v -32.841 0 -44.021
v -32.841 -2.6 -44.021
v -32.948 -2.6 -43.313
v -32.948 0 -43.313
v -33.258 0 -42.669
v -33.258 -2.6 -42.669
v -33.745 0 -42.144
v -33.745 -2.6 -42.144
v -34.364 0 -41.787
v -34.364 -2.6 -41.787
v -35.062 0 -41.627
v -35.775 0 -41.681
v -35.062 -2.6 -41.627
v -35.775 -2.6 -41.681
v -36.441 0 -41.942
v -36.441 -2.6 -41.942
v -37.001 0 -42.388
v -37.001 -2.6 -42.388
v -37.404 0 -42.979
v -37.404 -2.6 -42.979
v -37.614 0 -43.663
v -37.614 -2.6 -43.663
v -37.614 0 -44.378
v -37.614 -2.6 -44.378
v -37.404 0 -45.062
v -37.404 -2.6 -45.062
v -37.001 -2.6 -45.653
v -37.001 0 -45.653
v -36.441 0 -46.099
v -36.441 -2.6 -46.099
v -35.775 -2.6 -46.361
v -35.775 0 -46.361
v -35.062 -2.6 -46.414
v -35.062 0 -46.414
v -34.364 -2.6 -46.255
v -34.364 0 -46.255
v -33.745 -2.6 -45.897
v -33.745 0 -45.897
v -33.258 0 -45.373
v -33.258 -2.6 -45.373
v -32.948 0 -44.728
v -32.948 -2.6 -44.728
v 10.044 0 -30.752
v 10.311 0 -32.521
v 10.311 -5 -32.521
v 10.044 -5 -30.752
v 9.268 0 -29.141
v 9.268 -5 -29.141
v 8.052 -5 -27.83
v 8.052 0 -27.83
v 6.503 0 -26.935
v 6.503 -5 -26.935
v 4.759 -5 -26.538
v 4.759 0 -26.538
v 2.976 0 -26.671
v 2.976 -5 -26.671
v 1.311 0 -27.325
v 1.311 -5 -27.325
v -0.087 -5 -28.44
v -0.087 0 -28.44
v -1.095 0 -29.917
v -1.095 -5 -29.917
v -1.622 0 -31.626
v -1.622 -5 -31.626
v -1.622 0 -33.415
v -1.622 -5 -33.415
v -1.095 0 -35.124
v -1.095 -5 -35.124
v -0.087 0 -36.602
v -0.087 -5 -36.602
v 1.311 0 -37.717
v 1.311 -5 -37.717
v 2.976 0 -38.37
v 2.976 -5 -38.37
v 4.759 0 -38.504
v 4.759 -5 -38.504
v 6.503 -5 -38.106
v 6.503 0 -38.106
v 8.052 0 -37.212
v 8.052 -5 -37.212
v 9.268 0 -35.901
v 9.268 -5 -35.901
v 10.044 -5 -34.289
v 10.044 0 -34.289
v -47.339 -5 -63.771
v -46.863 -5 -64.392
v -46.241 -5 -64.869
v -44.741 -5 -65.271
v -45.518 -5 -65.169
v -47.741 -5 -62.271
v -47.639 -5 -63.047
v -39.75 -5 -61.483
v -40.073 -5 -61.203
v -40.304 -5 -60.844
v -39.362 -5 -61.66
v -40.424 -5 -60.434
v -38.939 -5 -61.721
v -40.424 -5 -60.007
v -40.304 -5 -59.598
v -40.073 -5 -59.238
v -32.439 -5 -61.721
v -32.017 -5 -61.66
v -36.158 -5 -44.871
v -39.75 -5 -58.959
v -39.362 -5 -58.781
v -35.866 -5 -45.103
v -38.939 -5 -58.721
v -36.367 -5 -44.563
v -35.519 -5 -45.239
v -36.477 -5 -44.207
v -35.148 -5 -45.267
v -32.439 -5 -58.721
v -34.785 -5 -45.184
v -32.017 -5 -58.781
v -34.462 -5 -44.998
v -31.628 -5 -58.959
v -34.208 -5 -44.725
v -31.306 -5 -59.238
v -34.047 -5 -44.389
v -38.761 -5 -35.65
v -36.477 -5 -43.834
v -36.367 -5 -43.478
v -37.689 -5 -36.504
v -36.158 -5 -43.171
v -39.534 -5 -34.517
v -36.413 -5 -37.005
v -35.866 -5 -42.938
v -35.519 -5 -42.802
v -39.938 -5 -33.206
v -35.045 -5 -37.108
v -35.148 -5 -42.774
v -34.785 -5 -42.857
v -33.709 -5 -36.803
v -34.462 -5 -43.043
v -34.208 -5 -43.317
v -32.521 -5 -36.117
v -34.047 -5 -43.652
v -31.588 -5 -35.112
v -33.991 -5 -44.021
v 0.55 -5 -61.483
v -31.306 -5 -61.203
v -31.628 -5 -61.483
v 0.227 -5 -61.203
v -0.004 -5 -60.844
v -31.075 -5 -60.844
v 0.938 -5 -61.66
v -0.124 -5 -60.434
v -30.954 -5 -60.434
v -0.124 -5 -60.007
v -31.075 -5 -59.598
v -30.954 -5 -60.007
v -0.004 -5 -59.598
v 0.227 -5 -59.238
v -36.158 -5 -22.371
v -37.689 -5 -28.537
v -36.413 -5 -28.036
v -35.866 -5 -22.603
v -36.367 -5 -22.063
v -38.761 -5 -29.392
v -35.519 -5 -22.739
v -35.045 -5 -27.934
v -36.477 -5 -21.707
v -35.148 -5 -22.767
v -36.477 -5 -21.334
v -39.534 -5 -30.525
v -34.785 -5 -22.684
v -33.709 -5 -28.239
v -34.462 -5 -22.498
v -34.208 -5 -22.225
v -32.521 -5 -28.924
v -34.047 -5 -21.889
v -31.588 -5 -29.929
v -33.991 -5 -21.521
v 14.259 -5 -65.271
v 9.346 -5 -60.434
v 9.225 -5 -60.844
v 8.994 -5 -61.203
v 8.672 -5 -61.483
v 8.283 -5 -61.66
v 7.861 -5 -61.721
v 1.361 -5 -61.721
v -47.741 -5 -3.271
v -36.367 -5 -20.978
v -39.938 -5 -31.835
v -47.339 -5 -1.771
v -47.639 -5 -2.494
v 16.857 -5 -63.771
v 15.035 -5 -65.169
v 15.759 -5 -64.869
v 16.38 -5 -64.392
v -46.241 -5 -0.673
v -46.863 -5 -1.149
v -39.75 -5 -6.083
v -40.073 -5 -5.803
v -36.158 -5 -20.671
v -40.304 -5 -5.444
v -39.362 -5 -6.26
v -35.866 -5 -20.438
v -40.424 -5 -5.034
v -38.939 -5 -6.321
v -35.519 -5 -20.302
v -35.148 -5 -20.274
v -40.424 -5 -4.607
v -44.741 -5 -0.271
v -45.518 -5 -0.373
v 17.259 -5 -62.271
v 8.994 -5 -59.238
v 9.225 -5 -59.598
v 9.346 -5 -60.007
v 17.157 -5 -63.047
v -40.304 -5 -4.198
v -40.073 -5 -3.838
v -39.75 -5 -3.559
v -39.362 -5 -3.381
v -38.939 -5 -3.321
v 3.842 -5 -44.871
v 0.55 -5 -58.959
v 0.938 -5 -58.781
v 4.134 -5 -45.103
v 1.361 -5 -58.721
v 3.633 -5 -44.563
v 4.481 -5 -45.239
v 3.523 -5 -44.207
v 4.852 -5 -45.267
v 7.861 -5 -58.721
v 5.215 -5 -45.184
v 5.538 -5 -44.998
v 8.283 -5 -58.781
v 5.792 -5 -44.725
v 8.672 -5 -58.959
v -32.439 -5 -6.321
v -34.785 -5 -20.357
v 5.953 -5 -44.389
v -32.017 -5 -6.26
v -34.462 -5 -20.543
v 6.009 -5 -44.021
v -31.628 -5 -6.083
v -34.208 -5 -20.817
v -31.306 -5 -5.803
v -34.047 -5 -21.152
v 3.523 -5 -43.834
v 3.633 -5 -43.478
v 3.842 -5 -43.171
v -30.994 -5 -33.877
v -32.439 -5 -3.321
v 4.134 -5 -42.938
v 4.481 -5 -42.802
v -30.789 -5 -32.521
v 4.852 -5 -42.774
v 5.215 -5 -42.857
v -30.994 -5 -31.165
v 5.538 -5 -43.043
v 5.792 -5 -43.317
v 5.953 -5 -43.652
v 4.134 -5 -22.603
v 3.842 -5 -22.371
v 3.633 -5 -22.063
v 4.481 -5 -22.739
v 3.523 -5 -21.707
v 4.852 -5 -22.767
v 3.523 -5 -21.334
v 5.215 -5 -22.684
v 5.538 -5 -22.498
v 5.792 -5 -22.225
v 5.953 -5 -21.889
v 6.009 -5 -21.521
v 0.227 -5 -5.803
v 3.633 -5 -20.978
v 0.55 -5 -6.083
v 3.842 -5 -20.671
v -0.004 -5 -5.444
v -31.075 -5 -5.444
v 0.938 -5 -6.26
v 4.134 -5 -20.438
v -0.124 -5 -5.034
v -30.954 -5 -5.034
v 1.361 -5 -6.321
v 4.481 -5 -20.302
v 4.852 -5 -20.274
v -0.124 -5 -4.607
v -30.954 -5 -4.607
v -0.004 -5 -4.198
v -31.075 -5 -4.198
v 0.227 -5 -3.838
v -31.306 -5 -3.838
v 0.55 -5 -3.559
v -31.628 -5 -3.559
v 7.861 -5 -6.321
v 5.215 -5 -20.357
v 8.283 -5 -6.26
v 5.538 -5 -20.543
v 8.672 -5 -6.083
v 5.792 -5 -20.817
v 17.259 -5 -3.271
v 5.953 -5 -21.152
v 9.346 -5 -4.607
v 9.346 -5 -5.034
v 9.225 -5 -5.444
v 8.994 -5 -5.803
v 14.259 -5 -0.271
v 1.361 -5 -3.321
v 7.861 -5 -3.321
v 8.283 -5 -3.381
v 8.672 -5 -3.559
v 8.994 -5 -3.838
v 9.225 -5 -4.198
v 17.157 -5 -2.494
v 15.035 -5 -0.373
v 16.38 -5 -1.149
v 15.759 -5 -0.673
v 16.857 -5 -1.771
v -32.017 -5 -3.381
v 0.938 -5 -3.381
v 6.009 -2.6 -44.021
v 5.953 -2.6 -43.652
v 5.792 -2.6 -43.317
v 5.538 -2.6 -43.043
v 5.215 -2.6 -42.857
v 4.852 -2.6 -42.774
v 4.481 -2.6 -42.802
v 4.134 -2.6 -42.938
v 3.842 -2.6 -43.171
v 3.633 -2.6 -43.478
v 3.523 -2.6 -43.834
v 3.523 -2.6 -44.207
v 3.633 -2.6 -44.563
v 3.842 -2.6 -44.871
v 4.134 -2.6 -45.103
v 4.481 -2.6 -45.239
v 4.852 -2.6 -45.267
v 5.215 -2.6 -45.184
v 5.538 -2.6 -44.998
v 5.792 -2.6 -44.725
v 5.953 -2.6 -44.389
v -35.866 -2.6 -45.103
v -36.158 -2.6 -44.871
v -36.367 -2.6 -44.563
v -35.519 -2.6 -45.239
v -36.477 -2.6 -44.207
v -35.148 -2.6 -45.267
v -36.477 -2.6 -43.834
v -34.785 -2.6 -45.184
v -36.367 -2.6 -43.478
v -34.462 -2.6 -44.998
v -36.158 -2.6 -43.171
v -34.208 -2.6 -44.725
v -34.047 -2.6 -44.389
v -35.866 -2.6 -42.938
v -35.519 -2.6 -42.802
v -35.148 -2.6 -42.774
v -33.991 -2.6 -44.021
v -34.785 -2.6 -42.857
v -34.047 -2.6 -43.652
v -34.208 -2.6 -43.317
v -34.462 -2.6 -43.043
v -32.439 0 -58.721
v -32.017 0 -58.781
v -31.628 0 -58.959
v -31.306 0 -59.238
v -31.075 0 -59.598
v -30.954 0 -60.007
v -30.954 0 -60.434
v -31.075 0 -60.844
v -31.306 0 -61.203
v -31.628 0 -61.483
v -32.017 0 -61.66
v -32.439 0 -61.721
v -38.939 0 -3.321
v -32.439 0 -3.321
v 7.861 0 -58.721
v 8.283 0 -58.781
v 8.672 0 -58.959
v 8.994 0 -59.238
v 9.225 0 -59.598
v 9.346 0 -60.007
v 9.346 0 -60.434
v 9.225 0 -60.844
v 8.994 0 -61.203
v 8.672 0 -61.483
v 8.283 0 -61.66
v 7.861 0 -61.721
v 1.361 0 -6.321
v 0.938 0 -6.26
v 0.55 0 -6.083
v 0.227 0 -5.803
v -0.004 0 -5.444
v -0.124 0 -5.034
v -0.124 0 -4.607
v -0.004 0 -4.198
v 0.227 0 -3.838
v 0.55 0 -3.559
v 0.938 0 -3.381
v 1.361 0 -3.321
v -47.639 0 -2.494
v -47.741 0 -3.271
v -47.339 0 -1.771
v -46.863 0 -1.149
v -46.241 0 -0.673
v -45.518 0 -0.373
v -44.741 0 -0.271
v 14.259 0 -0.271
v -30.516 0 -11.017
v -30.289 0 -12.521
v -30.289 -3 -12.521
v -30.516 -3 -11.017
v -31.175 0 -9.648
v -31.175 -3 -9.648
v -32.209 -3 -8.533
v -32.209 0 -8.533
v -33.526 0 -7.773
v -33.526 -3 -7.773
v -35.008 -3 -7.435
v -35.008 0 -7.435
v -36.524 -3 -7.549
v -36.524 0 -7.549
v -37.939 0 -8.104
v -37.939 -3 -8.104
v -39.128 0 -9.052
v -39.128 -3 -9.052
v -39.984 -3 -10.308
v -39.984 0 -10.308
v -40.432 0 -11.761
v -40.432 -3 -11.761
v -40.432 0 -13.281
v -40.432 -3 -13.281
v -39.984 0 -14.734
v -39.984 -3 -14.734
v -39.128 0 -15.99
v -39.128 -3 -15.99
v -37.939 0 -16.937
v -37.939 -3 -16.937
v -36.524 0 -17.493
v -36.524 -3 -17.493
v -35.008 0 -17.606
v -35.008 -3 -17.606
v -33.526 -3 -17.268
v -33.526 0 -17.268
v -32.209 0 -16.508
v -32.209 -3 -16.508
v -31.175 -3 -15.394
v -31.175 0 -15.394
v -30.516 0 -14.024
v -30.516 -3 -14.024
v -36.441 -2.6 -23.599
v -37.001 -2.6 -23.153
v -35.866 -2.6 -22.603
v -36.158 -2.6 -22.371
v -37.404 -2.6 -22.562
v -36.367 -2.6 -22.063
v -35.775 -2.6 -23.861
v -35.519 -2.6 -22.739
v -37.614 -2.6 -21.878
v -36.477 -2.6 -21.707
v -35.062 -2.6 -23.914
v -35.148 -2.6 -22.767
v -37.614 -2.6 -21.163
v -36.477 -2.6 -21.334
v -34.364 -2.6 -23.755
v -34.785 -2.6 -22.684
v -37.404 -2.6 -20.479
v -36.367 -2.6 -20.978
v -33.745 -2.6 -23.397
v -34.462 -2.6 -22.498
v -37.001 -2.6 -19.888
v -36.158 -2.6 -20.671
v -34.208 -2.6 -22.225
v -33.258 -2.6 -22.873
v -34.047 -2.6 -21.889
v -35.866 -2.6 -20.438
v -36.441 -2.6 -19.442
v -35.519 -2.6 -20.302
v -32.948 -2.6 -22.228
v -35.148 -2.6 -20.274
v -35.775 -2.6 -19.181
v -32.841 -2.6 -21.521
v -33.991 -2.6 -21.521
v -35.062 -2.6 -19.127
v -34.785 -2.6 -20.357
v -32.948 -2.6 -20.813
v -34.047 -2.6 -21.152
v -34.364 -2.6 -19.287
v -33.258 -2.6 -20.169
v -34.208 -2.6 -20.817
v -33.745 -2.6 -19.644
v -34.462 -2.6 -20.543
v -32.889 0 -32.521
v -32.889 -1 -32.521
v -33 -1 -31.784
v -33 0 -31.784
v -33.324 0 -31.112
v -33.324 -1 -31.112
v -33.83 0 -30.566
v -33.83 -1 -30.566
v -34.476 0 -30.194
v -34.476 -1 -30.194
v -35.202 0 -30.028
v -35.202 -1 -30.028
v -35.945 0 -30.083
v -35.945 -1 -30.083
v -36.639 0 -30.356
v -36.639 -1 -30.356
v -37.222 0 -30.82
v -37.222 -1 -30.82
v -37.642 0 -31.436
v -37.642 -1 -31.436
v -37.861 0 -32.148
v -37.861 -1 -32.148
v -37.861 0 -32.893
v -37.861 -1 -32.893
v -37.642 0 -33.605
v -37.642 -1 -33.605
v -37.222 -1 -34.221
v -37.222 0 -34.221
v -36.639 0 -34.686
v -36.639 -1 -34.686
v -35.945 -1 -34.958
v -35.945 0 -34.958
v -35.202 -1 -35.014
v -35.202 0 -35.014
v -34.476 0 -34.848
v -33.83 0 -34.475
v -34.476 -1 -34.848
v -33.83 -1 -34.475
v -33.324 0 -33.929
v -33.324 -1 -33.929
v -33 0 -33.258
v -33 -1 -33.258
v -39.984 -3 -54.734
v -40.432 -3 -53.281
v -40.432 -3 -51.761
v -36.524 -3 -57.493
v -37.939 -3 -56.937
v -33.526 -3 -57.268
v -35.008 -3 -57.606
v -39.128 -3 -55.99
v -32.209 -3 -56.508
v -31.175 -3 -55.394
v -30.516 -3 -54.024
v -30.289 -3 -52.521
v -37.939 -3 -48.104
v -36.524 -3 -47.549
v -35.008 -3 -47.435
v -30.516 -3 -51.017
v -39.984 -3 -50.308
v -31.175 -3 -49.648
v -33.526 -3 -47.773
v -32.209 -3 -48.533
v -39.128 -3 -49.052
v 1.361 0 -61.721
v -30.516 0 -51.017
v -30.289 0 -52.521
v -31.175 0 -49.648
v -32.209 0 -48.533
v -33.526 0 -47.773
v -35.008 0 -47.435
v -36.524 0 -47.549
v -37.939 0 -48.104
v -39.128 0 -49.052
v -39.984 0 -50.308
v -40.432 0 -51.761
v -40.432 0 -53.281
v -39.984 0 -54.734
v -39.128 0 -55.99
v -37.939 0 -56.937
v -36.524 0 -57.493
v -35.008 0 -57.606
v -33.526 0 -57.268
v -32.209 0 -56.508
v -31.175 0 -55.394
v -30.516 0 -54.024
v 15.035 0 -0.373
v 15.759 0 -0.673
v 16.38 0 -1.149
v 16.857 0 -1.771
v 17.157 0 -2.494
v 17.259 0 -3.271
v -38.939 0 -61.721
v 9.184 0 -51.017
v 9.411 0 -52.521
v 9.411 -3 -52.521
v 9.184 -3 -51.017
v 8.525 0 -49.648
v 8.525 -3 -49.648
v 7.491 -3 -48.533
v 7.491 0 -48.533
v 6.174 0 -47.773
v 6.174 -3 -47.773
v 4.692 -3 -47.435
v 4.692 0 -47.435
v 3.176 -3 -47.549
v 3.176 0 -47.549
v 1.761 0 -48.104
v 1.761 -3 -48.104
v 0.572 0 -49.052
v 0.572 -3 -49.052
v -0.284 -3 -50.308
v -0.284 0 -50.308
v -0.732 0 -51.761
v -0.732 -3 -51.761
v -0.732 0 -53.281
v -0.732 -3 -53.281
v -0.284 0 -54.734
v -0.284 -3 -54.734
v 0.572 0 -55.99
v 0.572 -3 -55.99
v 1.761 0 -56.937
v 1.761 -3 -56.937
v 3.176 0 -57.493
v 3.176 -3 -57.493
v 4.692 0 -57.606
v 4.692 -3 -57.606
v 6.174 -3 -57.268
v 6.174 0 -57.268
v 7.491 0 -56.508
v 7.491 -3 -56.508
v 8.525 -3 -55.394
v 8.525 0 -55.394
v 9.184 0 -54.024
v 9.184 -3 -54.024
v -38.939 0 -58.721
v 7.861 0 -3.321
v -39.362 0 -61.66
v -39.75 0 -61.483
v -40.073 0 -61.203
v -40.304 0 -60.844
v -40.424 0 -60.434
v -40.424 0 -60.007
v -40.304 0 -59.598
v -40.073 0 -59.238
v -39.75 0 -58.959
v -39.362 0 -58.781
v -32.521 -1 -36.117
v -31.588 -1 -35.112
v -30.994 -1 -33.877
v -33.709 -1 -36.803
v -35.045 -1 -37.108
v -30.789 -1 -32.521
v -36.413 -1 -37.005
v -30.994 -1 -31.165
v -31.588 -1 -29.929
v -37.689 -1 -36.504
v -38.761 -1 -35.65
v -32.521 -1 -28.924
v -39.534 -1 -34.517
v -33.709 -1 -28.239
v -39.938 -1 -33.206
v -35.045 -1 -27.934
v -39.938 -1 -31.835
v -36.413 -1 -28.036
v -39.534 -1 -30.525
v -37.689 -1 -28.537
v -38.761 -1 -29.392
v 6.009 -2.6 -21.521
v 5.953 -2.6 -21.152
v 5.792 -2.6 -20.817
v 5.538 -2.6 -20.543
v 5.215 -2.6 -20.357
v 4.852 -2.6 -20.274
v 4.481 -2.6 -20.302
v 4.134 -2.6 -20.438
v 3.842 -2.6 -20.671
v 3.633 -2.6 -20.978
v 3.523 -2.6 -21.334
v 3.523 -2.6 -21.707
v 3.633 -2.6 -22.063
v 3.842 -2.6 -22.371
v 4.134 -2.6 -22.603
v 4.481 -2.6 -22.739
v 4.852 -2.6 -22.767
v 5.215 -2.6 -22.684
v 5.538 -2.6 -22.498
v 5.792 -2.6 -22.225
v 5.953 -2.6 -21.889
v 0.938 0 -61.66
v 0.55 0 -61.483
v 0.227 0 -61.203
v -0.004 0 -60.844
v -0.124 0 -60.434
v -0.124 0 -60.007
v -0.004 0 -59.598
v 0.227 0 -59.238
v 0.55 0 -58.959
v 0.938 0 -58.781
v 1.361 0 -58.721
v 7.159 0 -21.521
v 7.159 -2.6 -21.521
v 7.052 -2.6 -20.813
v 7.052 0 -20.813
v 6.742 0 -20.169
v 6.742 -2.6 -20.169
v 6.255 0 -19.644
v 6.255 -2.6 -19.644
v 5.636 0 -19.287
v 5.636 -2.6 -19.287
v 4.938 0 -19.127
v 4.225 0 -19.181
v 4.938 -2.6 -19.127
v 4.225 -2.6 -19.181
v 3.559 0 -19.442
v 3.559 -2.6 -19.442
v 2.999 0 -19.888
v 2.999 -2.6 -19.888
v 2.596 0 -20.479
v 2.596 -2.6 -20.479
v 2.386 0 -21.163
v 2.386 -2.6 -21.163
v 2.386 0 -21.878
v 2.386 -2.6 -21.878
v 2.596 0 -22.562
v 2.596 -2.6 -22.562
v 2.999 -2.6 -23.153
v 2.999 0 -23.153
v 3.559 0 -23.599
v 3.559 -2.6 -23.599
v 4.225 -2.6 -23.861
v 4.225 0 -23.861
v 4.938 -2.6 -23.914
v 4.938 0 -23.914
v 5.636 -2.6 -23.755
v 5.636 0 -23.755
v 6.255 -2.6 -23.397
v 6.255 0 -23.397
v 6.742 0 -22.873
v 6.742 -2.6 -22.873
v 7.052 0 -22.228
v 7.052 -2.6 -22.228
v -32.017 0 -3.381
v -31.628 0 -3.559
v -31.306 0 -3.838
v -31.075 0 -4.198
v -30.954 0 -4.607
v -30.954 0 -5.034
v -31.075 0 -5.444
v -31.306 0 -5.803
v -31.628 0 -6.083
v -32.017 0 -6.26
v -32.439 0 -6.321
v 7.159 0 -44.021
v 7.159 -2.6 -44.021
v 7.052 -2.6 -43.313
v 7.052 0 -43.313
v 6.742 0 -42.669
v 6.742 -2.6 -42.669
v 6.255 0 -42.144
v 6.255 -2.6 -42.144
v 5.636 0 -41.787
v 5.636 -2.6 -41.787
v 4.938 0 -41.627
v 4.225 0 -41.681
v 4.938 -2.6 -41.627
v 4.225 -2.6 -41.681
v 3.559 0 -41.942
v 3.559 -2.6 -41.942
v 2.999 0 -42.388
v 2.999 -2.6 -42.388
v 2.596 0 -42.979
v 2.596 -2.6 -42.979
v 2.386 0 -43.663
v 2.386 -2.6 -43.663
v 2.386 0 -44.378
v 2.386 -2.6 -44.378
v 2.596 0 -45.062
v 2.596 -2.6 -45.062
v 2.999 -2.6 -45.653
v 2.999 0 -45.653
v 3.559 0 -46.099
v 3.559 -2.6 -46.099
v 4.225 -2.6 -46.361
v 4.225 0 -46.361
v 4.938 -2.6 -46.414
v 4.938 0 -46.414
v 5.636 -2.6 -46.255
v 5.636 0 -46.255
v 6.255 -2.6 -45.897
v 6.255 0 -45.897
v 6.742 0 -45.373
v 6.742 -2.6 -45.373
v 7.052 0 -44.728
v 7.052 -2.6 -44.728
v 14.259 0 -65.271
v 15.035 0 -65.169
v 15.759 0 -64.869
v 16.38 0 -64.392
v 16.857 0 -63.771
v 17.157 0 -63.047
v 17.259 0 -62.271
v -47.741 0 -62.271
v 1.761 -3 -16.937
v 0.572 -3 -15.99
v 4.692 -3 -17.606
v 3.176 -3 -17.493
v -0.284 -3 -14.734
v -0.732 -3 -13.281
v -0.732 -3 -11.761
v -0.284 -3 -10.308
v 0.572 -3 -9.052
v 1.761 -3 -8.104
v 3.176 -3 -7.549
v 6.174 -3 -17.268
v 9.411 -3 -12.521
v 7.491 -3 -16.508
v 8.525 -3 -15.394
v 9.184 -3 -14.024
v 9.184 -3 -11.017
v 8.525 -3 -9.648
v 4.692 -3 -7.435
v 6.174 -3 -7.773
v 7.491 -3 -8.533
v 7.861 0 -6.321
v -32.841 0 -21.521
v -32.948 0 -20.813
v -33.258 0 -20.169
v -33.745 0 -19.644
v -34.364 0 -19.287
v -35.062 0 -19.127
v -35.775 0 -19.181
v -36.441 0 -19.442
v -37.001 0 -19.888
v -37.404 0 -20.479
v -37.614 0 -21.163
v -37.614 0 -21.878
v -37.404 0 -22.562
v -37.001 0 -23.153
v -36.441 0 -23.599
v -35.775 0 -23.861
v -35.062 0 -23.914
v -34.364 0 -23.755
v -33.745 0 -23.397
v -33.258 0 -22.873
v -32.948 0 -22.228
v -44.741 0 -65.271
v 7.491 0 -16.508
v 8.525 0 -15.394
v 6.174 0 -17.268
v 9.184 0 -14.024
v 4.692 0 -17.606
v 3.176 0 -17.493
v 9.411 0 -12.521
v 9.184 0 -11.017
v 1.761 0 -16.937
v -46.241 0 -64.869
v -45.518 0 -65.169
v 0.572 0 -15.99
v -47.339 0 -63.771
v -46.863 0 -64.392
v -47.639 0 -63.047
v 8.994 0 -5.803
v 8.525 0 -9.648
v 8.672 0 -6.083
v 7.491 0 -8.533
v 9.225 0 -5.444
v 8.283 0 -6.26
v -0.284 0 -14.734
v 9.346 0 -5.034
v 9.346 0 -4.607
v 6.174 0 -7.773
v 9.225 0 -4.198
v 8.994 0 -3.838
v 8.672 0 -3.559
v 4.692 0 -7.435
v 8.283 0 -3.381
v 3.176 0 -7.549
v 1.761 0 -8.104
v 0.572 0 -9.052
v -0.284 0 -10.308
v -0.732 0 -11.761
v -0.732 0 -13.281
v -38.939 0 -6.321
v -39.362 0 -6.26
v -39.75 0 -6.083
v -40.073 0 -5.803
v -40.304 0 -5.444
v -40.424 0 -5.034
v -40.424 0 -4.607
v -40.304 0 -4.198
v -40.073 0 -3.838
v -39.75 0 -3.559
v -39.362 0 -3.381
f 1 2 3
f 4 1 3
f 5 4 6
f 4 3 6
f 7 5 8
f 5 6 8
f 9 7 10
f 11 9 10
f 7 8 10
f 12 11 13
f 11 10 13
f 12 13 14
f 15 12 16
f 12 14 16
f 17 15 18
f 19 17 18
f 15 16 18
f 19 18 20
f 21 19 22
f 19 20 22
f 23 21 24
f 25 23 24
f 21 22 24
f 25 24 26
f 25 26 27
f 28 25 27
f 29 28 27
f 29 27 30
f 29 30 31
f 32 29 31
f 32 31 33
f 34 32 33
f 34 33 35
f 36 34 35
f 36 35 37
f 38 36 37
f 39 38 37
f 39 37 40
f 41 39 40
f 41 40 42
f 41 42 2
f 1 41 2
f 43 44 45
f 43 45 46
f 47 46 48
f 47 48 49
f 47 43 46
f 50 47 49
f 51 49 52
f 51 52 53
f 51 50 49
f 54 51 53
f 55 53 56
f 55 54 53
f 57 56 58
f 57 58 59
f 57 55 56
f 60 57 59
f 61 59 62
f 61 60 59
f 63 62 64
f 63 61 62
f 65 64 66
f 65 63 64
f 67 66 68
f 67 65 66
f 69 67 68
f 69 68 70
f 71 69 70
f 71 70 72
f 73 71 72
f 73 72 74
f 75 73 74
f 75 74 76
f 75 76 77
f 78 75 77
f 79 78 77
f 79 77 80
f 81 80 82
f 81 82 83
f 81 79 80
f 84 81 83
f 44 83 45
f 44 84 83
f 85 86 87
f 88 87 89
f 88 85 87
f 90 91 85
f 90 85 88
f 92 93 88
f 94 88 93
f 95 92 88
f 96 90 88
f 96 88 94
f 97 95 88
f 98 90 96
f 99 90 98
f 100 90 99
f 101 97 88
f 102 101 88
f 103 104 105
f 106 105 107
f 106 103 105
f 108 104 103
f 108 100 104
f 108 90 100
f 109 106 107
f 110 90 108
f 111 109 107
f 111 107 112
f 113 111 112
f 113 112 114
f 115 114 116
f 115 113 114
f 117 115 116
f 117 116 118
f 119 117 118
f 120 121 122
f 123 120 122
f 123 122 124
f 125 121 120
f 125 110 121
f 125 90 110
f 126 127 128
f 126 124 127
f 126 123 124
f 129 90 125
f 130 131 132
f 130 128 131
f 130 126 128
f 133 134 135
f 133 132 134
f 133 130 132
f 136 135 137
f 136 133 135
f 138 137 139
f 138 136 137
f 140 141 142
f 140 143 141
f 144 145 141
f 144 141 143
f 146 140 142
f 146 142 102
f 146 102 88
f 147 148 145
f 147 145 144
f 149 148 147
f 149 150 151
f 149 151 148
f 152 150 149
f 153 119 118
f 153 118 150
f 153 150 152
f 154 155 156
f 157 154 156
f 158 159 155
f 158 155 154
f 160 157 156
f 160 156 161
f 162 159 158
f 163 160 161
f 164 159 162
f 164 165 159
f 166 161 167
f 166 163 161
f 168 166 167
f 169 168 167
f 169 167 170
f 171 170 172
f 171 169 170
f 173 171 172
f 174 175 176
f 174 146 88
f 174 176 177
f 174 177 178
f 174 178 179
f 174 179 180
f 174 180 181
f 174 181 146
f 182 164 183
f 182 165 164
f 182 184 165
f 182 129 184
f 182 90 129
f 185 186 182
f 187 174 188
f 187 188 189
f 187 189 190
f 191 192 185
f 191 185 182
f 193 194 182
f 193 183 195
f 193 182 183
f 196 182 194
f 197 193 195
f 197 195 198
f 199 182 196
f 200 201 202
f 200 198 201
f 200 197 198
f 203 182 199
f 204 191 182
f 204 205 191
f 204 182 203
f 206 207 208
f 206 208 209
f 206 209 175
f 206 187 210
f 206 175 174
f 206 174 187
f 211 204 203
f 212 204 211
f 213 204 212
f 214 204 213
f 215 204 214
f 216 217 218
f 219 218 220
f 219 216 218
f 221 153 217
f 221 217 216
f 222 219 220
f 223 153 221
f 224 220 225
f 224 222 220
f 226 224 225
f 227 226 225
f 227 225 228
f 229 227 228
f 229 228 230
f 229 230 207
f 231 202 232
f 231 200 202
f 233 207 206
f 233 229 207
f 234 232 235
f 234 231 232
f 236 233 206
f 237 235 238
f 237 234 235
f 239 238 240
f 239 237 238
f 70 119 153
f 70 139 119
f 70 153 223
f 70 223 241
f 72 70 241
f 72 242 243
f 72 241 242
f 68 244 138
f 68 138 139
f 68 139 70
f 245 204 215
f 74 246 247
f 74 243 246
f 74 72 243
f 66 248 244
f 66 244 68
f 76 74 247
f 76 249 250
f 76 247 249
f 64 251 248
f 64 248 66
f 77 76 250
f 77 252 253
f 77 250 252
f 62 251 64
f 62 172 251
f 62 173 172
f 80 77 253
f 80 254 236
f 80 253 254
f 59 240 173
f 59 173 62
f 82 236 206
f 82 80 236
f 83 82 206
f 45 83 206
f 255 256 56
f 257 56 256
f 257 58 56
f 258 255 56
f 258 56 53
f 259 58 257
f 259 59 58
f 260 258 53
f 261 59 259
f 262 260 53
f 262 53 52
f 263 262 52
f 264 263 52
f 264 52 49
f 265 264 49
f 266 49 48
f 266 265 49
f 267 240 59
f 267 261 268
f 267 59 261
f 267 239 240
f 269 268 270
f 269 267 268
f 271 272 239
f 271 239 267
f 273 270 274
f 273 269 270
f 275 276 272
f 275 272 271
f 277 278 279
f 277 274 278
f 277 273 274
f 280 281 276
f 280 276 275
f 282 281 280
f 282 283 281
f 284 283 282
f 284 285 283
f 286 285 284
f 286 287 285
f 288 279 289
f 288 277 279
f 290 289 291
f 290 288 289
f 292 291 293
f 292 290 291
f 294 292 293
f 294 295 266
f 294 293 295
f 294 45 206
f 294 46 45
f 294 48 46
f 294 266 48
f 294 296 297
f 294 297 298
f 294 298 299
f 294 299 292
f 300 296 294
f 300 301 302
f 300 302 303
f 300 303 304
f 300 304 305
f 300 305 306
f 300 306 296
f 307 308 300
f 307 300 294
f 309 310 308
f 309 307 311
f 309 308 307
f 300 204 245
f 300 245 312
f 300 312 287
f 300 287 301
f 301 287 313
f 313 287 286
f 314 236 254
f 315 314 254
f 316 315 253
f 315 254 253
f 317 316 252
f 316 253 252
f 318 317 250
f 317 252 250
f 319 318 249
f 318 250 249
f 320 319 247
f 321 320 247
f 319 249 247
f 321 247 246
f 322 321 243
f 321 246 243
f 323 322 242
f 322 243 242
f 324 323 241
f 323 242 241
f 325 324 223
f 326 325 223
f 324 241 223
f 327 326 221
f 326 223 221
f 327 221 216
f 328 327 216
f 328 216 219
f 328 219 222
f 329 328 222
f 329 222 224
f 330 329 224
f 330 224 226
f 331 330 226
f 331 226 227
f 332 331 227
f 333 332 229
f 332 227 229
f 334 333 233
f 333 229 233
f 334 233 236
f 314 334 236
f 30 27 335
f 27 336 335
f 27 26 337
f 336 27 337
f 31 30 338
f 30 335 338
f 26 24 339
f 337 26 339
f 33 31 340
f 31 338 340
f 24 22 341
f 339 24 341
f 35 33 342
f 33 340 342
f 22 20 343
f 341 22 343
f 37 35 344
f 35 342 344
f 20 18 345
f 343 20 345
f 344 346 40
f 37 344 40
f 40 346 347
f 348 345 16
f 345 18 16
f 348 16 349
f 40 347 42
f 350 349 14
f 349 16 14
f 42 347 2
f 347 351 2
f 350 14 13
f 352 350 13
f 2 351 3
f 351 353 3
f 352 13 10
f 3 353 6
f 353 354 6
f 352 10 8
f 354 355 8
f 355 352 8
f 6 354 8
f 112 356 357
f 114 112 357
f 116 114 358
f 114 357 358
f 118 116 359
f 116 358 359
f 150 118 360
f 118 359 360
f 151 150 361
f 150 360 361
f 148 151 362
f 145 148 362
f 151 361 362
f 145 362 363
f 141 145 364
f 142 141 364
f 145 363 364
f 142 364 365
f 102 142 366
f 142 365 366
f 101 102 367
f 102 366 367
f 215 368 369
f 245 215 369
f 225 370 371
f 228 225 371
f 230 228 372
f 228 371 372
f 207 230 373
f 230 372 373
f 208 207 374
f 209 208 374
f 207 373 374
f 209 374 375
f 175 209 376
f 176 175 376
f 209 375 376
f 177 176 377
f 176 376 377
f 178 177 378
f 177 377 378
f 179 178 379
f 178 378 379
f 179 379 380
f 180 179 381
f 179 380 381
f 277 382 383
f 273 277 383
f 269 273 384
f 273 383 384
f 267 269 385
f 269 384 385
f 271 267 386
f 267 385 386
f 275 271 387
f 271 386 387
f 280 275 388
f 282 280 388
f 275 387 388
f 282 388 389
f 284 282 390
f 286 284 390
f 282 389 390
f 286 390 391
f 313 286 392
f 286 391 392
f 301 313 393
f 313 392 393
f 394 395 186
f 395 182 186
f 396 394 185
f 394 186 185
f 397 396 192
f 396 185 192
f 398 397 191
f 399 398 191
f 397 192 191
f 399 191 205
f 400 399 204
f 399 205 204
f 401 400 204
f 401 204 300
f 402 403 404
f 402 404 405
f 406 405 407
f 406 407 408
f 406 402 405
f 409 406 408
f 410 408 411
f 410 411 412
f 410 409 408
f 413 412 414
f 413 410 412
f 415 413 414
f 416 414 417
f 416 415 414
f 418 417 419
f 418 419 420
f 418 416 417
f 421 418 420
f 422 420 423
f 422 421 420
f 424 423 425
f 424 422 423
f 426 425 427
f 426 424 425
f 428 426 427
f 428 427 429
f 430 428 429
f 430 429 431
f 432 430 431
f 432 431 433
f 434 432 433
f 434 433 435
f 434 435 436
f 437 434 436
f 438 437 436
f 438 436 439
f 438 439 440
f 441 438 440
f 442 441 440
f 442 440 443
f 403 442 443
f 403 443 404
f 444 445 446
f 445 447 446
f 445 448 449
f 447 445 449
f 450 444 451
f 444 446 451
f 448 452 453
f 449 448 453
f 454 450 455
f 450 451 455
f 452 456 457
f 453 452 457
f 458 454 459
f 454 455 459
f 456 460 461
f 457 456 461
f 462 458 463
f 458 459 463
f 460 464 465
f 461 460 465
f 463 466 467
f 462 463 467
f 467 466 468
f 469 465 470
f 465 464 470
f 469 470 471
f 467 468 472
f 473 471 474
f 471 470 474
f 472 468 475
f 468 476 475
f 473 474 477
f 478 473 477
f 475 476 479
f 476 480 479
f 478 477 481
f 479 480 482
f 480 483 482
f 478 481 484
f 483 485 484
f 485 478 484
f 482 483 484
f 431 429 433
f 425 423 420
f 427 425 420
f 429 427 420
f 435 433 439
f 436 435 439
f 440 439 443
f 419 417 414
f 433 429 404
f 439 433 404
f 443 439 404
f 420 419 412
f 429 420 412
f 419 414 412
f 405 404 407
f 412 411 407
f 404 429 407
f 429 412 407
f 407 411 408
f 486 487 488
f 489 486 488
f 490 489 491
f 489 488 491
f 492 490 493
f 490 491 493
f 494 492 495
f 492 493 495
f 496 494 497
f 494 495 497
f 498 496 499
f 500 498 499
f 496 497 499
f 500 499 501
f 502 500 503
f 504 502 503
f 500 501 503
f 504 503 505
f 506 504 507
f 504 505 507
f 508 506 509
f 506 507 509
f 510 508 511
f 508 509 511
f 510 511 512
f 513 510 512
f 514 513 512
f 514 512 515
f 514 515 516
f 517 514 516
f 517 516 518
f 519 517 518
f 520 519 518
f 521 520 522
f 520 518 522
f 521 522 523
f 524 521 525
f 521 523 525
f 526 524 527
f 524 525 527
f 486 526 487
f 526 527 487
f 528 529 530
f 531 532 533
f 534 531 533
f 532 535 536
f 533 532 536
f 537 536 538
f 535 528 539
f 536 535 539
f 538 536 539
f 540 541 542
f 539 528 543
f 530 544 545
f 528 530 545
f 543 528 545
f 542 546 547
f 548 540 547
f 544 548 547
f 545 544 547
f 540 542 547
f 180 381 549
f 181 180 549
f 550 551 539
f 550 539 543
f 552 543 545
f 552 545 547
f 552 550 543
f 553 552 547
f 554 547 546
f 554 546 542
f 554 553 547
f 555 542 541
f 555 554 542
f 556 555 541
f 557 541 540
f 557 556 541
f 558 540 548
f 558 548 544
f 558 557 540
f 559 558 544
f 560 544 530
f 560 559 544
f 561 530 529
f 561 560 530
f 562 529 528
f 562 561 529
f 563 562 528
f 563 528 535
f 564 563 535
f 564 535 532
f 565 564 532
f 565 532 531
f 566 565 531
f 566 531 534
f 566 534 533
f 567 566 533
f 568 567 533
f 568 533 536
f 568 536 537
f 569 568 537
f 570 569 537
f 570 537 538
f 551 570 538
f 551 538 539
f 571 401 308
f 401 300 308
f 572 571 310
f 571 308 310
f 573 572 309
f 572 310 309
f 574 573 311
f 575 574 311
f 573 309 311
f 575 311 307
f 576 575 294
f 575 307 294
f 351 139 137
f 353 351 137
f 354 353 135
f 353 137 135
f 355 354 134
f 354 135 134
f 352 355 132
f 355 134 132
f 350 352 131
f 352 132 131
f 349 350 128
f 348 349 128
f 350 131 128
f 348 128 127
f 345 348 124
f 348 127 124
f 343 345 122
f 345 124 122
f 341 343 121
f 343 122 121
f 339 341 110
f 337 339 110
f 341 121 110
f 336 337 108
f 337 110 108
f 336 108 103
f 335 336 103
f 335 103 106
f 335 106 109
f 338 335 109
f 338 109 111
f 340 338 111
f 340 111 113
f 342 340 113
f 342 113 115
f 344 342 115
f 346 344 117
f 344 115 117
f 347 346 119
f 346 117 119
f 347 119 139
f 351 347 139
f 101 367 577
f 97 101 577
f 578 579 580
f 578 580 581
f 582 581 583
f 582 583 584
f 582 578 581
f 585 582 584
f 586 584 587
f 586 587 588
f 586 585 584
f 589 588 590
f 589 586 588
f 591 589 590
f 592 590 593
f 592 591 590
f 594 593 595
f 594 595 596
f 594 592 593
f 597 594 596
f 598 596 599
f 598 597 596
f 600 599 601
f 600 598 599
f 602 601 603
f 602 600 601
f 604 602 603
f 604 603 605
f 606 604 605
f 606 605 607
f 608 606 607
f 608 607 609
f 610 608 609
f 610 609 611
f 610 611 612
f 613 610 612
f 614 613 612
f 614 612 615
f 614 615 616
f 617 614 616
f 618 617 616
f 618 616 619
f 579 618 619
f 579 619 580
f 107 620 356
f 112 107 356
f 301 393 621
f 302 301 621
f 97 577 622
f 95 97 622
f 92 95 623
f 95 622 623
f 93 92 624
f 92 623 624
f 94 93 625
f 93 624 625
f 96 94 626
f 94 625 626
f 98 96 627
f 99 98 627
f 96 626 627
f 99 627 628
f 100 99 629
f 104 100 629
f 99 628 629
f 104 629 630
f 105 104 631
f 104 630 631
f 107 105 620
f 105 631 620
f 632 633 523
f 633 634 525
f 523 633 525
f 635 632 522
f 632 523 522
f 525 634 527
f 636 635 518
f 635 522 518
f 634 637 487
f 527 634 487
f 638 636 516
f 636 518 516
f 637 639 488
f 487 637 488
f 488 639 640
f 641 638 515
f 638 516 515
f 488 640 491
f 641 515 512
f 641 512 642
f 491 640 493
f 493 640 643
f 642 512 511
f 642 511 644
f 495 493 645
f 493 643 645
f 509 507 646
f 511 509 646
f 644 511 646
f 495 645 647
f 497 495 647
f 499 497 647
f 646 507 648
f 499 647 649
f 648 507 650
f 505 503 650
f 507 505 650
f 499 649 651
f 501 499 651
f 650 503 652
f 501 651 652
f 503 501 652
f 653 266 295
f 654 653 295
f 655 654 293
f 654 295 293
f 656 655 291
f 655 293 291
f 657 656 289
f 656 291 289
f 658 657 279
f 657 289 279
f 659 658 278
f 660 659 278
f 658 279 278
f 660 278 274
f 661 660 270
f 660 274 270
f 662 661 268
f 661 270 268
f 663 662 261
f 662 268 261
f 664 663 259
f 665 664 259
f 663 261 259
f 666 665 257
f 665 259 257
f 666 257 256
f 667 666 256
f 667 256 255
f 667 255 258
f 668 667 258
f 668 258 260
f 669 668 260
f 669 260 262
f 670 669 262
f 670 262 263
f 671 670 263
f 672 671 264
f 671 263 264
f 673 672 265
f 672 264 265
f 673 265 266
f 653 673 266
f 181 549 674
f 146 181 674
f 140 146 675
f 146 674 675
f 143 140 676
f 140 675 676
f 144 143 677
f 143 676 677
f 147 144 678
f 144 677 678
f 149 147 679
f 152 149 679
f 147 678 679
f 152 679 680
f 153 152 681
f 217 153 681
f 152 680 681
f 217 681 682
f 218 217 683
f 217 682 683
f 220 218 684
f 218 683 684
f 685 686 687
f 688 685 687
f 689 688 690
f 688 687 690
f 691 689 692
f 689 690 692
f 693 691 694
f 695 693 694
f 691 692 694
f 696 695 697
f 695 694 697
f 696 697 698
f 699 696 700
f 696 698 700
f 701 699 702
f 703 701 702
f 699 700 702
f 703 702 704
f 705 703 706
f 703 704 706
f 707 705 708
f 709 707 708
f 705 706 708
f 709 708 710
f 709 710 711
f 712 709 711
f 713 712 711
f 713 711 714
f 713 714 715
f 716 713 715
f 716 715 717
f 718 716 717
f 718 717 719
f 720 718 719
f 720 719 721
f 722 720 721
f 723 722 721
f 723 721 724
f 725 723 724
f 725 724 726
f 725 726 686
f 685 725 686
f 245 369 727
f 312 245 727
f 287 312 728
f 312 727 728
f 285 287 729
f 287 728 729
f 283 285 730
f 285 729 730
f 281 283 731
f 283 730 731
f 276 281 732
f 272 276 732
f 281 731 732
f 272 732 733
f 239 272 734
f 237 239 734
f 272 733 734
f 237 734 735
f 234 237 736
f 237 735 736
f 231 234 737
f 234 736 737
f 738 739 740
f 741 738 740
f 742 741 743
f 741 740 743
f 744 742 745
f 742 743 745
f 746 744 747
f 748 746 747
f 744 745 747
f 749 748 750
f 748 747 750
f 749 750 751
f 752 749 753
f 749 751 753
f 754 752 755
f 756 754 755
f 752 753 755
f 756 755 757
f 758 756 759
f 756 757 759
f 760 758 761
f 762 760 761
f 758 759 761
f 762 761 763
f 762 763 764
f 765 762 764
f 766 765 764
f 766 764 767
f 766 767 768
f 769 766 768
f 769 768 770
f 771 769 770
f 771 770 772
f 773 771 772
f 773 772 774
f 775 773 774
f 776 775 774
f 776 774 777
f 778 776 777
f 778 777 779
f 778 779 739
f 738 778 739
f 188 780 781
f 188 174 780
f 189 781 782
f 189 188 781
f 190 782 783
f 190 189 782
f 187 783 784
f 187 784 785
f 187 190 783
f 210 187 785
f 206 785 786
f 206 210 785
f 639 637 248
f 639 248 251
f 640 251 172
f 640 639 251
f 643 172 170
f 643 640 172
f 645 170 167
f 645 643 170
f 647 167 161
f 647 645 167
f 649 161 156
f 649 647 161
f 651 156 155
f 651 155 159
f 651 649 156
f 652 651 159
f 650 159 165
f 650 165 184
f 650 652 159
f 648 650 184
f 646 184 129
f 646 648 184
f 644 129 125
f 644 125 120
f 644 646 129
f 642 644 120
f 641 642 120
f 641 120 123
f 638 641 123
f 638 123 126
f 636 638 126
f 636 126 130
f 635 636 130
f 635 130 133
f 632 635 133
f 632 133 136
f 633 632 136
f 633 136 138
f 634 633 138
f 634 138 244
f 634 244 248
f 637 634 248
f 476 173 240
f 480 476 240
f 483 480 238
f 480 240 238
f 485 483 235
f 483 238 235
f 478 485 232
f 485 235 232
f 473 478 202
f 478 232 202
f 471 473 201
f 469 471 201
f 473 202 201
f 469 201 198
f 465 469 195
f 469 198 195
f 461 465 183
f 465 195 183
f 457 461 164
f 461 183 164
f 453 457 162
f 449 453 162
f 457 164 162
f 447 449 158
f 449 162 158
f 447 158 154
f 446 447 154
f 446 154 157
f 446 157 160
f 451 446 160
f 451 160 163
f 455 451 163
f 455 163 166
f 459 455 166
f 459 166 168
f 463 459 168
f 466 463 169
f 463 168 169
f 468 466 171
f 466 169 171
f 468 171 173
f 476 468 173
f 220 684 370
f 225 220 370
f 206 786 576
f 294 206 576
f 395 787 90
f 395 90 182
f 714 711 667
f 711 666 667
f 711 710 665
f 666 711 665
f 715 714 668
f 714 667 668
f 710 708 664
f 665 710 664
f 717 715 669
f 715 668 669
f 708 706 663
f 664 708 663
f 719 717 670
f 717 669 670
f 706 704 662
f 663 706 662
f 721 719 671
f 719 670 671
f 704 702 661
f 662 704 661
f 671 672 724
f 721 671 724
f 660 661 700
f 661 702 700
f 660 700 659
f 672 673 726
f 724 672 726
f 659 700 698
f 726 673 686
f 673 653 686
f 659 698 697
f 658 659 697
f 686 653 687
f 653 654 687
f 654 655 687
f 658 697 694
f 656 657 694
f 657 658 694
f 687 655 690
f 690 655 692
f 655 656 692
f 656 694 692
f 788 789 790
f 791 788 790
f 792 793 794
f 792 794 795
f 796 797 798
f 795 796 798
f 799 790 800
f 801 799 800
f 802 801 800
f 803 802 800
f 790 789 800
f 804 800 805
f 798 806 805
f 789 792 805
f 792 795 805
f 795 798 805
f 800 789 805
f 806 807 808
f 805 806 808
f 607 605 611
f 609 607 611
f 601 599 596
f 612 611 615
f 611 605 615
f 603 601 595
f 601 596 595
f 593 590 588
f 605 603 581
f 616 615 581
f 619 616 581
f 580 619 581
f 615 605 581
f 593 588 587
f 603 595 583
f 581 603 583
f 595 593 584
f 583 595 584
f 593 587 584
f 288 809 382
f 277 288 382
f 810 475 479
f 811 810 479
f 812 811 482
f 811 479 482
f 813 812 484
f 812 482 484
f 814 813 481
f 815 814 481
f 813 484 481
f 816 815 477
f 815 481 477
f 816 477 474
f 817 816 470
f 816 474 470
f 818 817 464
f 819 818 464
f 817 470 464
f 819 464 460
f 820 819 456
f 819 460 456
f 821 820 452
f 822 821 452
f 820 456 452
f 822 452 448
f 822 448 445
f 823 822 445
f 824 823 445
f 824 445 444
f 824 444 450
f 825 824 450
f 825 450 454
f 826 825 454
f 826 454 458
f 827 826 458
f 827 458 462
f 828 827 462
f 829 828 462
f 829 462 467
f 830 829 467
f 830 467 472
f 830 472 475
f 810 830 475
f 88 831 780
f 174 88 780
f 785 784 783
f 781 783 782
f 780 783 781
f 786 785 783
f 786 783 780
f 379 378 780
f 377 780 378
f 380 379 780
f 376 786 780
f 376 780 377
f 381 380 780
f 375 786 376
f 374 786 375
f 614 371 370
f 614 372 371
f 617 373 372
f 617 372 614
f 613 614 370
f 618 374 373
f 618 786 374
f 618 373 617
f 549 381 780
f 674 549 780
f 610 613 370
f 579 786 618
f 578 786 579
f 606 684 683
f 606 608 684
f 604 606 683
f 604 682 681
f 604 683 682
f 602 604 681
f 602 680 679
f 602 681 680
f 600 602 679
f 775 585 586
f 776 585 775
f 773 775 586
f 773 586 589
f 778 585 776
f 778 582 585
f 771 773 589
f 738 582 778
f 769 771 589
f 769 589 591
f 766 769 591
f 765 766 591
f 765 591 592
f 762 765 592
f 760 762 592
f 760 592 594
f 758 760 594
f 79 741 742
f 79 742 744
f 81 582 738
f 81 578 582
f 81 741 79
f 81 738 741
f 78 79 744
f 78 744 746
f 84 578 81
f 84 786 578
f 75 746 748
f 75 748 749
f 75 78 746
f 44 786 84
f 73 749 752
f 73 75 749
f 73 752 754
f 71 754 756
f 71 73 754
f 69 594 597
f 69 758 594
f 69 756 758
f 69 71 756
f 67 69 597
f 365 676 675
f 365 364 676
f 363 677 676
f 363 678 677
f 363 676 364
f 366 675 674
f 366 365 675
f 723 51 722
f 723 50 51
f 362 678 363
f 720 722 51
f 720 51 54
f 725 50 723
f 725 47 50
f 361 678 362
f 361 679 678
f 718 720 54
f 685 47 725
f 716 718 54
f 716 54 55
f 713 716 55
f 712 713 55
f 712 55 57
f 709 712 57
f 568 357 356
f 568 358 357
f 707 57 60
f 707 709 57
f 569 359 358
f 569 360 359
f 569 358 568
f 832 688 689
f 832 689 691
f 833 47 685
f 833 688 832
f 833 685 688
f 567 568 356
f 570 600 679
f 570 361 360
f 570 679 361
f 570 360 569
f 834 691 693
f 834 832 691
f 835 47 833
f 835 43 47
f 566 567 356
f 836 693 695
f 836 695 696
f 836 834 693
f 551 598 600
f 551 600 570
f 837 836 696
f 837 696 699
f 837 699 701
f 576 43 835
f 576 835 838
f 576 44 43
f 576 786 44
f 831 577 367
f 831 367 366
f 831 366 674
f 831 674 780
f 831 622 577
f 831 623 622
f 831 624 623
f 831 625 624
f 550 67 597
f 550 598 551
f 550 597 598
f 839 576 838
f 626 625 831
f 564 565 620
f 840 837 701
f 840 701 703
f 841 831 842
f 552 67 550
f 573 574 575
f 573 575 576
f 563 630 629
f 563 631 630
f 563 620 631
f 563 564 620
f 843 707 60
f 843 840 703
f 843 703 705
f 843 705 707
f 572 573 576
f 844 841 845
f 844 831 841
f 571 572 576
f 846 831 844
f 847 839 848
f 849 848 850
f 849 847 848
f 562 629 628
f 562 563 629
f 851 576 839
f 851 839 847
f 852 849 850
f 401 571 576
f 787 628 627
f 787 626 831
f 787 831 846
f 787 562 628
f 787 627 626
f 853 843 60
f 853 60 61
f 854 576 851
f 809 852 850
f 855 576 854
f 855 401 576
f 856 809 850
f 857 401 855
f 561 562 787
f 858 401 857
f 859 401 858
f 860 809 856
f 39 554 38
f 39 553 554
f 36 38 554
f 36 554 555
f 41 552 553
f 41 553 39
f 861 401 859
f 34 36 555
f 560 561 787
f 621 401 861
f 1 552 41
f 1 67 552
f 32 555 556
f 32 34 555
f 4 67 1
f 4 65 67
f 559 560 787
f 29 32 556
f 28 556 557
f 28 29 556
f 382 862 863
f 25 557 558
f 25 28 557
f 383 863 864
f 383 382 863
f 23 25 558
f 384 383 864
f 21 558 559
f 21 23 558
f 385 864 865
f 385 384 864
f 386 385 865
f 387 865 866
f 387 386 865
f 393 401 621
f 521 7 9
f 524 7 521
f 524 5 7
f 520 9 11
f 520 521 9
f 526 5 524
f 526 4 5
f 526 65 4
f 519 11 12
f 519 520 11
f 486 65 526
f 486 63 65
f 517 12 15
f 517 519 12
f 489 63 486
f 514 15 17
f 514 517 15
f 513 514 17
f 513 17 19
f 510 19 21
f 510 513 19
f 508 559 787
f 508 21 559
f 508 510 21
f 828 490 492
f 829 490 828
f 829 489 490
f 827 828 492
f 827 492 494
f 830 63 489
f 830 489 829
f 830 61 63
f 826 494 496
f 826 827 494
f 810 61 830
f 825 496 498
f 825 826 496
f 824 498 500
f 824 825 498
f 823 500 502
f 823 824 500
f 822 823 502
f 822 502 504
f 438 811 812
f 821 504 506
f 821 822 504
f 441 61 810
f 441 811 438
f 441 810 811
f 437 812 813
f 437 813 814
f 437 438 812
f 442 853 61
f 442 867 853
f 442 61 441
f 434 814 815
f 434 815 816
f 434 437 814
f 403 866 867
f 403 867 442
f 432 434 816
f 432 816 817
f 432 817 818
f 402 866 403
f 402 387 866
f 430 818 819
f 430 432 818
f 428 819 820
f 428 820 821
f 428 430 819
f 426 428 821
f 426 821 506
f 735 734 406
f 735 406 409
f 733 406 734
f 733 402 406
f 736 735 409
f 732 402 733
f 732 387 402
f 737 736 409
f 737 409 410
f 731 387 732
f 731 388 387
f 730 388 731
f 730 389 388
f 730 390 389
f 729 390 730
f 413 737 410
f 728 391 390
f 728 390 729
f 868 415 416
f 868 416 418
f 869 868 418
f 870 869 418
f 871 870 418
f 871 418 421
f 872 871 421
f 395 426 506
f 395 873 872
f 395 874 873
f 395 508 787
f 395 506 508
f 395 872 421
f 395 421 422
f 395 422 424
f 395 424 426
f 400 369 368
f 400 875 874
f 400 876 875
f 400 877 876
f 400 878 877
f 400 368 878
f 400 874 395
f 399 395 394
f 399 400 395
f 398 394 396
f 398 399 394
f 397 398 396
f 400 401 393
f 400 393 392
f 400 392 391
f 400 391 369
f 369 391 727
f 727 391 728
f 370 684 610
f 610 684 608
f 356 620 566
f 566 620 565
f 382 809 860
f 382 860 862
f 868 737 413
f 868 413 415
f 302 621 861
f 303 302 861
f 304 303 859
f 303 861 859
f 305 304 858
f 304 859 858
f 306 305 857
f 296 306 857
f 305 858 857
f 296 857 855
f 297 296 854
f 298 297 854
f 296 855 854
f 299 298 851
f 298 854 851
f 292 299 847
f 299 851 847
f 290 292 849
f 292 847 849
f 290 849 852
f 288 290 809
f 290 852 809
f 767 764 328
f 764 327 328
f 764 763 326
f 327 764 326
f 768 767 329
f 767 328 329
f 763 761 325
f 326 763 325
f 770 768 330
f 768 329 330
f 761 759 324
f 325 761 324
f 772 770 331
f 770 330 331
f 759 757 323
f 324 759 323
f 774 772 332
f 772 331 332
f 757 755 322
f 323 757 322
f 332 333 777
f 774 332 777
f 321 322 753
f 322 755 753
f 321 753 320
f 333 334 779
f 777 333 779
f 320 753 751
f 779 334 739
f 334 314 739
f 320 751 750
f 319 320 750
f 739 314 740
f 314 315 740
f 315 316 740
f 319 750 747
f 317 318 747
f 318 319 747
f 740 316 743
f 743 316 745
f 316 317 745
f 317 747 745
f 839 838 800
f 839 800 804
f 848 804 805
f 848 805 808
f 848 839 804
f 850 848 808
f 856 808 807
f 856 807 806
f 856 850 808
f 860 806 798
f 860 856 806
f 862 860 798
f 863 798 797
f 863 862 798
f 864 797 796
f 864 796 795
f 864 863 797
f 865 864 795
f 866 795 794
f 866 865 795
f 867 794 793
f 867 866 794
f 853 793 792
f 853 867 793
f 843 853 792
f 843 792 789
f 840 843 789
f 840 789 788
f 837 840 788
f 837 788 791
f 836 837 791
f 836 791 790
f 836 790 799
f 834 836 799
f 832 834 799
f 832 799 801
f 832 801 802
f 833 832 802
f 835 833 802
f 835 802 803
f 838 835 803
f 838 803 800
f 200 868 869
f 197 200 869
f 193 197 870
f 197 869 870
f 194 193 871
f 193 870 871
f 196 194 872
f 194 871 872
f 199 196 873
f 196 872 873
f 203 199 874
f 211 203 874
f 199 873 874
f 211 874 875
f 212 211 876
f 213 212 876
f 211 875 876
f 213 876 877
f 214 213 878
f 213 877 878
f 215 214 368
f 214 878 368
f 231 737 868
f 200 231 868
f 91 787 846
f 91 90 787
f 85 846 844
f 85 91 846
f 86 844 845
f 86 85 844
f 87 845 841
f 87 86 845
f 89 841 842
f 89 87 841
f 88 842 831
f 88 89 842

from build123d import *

# Parameters (mm, degrees)
CROQUIS1_W              = 65
CROQUIS1_H              = 65
CROQUIS1_R              = 5.1
CROQUIS1_R_2            = 6
CROQUIS1_R_3            = 4.6
SALIENTE_EXTRUIR1_DEPTH = 5
REDONDEO2_R             = 3
CROQUIS2_R              = 4.6
SALIENTE_EXTRUIR2_DEPTH = 1
CROQUIS3_R              = 2.5
CORTAR_EXTRUIR1_DEPTH   = 1
CROQUIS4_R              = 2.4
CORTAR_EXTRUIR2_DEPTH   = 10
CROQUIS5_R              = 2.4
CROQUIS5_R_2            = 1.25
SALIENTE_EXTRUIR3_DEPTH = 2.4
SALIENTE_EXTRUIR4_START = -2
CROQUIS6_R              = 5.1
SALIENTE_EXTRUIR4_DEPTH = 2


with BuildPart() as part:
    # Croquis1 → Saliente-Extruir1 (new body)
    with BuildSketch(Plane.XZ):
        with Locations((-15.241230111, -32.770729042)):
            Rectangle(CROQUIS1_W, CROQUIS1_H)
        with Locations((-35.389174066, -12.520729042)):
            Circle(CROQUIS1_R, mode=Mode.SUBTRACT)
        with Locations((4.310825934, -12.520729042)):
            Circle(CROQUIS1_R, mode=Mode.SUBTRACT)
        with Locations((-35.389174066, -52.520729042)):
            Circle(CROQUIS1_R, mode=Mode.SUBTRACT)
        with Locations((4.310825934, -52.520729042)):
            Circle(CROQUIS1_R, mode=Mode.SUBTRACT)
        with Locations((4.310825934, -32.520729042)):
            Circle(CROQUIS1_R_2, mode=Mode.SUBTRACT)
        with Locations((-35.389174066, -32.520729042)):
            Circle(CROQUIS1_R_3, mode=Mode.SUBTRACT)
        with BuildLine():
            Line((-32.439174066, -6.320729042), (-38.939173538, -6.320729042))
            ThreePointArc((-38.939173538, -6.320729042), (-40.439173538, -4.820729042), (-38.939173538, -3.320729042))
            Line((-38.939173538, -3.320729042), (-32.439174066, -3.320729042))
            ThreePointArc((-32.439174066, -3.320729042), (-30.939174066, -4.820729042), (-32.439174066, -6.320729042))
        make_face(mode=Mode.SUBTRACT)
        with BuildLine():
            Line((7.860825934, -6.320729042), (1.360825562, -6.320729042))
            ThreePointArc((1.360825562, -6.320729042), (-0.139174438, -4.820729042), (1.360825562, -3.320729042))
            Line((1.360825562, -3.320729042), (7.860825934, -3.320729042))
            ThreePointArc((7.860825934, -3.320729042), (9.360825934, -4.820729042), (7.860825934, -6.320729042))
        make_face(mode=Mode.SUBTRACT)
        with BuildLine():
            Line((-38.939173538, -58.720729042), (-32.439174066, -58.720729042))
            ThreePointArc((-32.439174066, -58.720729042), (-30.939174066, -60.220729042), (-32.439174066, -61.720729042))
            Line((-32.439174066, -61.720729042), (-38.939173538, -61.720729042))
            ThreePointArc((-38.939173538, -61.720729042), (-40.439173538, -60.220729042), (-38.939173538, -58.720729042))
        make_face(mode=Mode.SUBTRACT)
        with BuildLine():
            Line((7.860825934, -61.720729042), (1.360825562, -61.720729042))
            ThreePointArc((1.360825562, -61.720729042), (-0.139174438, -60.220729042), (1.360825562, -58.720729042))
            Line((1.360825562, -58.720729042), (7.860825934, -58.720729042))
            ThreePointArc((7.860825934, -58.720729042), (9.360825934, -60.220729042), (7.860825934, -61.720729042))
        make_face(mode=Mode.SUBTRACT)
    extrude(amount=SALIENTE_EXTRUIR1_DEPTH)

    # Redondeo2
    redondeo2_edges = [part.edges().sort_by_distance(p)[0] for p in [
        (-47.741230111, -2.5, -0.270729042),
        (17.258769889, -2.5, -0.270729042),
        (17.258769889, -2.5, -65.270729042),
        (-47.741230111, -2.5, -65.270729042),
    ]]
    fillet(redondeo2_edges, radius=REDONDEO2_R)

    # Croquis2 → Saliente-Extruir2 (add)
    with BuildSketch(Plane(origin=(0, 0, 0), x_dir=(1, 0, 0), z_dir=(0, 1, 0))):
        with Locations(Location((-35.389174066, 32.520729042, 0), (0, 0, 180))):
            Circle(CROQUIS2_R)
    extrude(amount=-SALIENTE_EXTRUIR2_DEPTH)

    # Croquis3 → Cortar-Extruir1 (cut)
    with BuildSketch(Plane.XZ.offset(1)):
        with Locations((-35.389174066, -32.520729042)):
            Circle(CROQUIS3_R)
    extrude(amount=-CORTAR_EXTRUIR1_DEPTH, mode=Mode.SUBTRACT)

    # Croquis4 → Cortar-Extruir2 (cut)
    with BuildSketch(Plane.XZ.offset(5)):
        with Locations((-35.241230111, -44.020729042)):
            Circle(CROQUIS4_R)
        with Locations((-35.241230111, -21.520729042)):
            Circle(CROQUIS4_R)
        with Locations((4.758769889, -21.520729042)):
            Circle(CROQUIS4_R)
        with Locations((4.758769889, -44.020729042)):
            Circle(CROQUIS4_R)
    extrude(amount=-CORTAR_EXTRUIR2_DEPTH, mode=Mode.SUBTRACT)

    # Croquis5 → Saliente-Extruir3 (add)
    # profile 1 of 4: a face of its own
    with BuildSketch(Plane.XZ.offset(5)):
        with Locations((-35.241230111, -44.020729042)):
            Circle(CROQUIS5_R)
        with Locations((-35.241230111, -44.020729042)):
            Circle(CROQUIS5_R_2, mode=Mode.SUBTRACT)
    # profile 2 of 4: a face of its own
    with BuildSketch(Plane.XZ.offset(5)):
        with Locations((-35.241230111, -21.520729042)):
            Circle(CROQUIS5_R)
        with Locations((-35.241230111, -21.520729042)):
            Circle(CROQUIS5_R_2, mode=Mode.SUBTRACT)
    # profile 3 of 4: a face of its own
    with BuildSketch(Plane.XZ.offset(5)):
        with Locations((4.758769889, -21.520729042)):
            Circle(CROQUIS5_R)
        with Locations((4.758769889, -21.520729042)):
            Circle(CROQUIS5_R_2, mode=Mode.SUBTRACT)
    # profile 4 of 4: a face of its own
    with BuildSketch(Plane.XZ.offset(5)):
        with Locations((4.758769889, -44.020729042)):
            Circle(CROQUIS5_R)
        with Locations((4.758769889, -44.020729042)):
            Circle(CROQUIS5_R_2, mode=Mode.SUBTRACT)
    extrude(amount=-SALIENTE_EXTRUIR3_DEPTH)

    # Croquis6 → Saliente-Extruir4 (add)
    with BuildSketch(Plane.XZ.offset(5).offset(SALIENTE_EXTRUIR4_START)):
        with Locations((-35.389174066, -52.520729042)):
            Circle(CROQUIS6_R)
        with Locations((4.310825934, -52.520729042)):
            Circle(CROQUIS6_R)
        with Locations((4.310825934, -12.520729042)):
            Circle(CROQUIS6_R)
        with Locations((-35.389174066, -12.520729042)):
            Circle(CROQUIS6_R)
    extrude(amount=SALIENTE_EXTRUIR4_DEPTH)


solid = part.part
